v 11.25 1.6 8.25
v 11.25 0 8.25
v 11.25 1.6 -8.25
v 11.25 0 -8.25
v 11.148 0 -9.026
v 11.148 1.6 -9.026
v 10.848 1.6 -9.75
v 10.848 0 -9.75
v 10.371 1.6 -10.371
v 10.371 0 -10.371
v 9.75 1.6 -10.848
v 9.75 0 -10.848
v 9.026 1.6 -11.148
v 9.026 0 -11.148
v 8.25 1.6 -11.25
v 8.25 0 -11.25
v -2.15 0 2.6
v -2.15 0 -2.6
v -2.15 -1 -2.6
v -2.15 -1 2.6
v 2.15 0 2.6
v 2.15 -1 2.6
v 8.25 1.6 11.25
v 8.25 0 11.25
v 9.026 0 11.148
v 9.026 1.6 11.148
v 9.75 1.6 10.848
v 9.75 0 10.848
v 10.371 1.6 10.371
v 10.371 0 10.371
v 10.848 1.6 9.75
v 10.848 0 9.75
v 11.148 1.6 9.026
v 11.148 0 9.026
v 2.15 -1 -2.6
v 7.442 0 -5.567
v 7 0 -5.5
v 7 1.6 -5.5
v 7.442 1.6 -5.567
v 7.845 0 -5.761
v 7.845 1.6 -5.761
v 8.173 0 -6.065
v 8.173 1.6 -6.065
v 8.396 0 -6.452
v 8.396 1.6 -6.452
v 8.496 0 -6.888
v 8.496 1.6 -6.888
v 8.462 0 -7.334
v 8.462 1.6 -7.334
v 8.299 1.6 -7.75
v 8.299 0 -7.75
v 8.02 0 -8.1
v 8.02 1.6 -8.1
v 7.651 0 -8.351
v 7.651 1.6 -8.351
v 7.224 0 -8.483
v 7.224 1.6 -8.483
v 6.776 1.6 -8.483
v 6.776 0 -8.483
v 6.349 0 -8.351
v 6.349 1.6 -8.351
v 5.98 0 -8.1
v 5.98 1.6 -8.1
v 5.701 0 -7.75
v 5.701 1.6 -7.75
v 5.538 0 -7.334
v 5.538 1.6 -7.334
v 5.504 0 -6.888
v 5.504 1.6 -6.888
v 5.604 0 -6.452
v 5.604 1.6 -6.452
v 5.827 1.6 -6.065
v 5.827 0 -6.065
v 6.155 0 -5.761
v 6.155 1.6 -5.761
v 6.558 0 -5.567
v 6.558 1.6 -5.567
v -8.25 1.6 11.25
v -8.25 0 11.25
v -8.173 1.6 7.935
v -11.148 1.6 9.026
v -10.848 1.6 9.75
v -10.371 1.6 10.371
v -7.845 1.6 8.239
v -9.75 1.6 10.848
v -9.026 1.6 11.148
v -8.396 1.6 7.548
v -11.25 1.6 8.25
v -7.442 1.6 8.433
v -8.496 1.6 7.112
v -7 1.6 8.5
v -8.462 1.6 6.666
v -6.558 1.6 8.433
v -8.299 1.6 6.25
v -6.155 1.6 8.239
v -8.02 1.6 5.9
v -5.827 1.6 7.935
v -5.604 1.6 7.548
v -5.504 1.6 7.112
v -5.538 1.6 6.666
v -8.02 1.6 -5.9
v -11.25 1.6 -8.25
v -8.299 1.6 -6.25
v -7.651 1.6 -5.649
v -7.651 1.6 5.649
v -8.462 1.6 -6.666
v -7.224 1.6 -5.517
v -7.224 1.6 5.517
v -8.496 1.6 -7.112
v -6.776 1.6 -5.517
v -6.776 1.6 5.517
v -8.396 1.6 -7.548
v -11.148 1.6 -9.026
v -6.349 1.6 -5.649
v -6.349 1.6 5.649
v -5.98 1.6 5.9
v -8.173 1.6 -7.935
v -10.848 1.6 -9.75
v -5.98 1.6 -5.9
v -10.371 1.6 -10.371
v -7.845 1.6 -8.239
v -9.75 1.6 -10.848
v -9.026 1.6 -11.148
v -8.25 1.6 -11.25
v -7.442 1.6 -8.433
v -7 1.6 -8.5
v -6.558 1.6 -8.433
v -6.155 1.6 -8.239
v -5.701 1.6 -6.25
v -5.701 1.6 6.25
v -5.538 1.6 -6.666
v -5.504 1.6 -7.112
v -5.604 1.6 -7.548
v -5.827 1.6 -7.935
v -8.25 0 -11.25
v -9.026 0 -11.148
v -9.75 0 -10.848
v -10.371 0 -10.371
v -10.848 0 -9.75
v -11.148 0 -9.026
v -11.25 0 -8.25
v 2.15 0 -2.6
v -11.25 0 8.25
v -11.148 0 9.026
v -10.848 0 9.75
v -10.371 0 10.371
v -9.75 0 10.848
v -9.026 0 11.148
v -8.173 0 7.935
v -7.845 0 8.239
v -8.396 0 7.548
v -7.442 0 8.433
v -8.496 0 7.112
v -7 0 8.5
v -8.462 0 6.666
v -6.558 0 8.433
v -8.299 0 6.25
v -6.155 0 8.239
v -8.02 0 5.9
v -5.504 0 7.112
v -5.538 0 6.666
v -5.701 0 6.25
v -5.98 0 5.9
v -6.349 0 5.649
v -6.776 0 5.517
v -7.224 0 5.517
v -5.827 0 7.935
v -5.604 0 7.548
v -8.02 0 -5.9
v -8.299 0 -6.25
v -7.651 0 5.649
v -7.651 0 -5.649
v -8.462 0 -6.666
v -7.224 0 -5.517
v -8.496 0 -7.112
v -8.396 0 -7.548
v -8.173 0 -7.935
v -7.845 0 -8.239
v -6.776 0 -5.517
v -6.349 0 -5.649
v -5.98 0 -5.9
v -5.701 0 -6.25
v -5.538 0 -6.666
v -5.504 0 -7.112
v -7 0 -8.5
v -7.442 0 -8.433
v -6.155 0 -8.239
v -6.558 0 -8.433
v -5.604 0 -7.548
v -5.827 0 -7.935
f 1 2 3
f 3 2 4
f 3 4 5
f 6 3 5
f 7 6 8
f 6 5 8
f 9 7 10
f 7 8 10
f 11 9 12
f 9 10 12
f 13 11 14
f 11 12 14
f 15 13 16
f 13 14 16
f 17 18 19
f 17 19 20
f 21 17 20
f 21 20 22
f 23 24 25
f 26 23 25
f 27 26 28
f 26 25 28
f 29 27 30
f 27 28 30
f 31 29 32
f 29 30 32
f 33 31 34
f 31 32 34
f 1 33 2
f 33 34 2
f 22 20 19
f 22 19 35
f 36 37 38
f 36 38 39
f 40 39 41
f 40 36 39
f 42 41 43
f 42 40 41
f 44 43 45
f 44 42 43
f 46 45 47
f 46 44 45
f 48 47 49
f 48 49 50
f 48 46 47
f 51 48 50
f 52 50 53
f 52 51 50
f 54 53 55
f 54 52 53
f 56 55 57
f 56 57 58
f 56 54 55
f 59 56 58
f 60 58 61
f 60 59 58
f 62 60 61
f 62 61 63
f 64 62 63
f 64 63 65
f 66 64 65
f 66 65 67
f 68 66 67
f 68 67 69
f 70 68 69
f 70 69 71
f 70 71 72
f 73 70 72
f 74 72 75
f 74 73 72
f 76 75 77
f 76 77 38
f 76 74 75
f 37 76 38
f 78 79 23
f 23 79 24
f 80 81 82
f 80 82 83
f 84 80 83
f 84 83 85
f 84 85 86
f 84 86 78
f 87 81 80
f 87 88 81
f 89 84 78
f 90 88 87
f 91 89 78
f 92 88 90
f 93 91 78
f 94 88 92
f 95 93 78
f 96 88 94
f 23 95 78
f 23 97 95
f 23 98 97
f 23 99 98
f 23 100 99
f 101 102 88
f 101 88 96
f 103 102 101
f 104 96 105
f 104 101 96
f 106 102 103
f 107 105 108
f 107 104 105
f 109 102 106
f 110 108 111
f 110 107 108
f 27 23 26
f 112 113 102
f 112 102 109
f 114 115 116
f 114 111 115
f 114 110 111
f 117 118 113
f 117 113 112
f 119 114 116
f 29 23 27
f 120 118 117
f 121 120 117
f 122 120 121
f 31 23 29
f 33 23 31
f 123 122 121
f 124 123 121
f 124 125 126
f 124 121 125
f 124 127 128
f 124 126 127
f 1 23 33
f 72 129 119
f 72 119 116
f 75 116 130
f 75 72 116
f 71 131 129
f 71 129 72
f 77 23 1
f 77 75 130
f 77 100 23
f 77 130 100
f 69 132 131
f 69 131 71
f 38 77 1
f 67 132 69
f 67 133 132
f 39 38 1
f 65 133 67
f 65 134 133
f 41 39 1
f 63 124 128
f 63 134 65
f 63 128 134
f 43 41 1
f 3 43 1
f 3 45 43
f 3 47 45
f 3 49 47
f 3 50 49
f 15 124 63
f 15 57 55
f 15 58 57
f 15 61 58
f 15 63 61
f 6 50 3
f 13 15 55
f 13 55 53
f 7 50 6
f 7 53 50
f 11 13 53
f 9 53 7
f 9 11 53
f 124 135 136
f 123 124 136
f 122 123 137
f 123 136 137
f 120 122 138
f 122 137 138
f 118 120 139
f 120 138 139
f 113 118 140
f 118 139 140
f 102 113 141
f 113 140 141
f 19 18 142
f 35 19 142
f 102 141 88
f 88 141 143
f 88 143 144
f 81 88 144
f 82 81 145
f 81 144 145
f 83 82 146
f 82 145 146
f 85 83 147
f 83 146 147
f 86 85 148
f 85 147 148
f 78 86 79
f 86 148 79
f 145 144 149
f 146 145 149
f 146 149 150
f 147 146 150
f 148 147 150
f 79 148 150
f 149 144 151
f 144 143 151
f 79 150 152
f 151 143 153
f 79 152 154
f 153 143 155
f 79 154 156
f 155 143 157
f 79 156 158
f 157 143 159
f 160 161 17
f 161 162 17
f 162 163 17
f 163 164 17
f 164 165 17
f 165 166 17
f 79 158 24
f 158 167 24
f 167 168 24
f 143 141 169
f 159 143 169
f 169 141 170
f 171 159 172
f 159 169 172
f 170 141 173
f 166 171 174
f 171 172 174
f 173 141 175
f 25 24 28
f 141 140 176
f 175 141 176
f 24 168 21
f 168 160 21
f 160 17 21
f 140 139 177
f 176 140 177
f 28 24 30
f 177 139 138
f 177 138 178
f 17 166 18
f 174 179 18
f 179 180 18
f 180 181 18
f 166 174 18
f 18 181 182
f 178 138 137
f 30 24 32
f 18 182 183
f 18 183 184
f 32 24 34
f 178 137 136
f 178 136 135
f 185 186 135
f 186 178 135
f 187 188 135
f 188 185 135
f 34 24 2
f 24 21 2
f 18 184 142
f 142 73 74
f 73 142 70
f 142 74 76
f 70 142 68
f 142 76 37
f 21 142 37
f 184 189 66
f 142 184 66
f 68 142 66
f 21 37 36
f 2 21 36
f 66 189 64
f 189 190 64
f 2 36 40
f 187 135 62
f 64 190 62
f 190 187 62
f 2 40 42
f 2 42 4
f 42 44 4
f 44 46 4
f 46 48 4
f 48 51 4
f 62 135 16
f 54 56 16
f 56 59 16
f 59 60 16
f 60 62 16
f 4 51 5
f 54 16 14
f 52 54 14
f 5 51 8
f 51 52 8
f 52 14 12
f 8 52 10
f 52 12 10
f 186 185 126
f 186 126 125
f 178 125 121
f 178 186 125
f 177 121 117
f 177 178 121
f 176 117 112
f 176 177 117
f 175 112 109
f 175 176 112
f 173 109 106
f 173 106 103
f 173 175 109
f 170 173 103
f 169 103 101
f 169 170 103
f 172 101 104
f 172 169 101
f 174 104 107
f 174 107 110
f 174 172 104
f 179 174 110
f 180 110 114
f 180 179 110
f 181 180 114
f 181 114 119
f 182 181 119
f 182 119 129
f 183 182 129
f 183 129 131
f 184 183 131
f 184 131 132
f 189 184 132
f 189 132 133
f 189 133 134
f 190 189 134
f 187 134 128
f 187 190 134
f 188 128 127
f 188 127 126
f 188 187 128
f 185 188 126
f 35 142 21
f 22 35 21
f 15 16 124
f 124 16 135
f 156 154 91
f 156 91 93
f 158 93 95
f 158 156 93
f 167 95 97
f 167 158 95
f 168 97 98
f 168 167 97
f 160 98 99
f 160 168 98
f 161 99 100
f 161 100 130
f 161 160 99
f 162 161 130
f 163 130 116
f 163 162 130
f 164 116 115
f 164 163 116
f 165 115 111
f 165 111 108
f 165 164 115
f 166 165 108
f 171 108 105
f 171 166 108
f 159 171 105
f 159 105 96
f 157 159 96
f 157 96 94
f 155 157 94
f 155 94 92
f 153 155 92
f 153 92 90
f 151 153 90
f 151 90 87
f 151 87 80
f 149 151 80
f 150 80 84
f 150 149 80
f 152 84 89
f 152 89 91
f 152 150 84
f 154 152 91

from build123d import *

# Parameters (mm, degrees)
SKETCH1_R           = 1.5
BOSS_EXTRUDE1_DEPTH = 1.6
SKETCH2_W           = 4.3
SKETCH2_H           = 5.2
BOSS_EXTRUDE2_DEPTH = 1


with BuildPart() as part:
    # Sketch1 → Boss-Extrude1 (new body)
    with BuildSketch(Plane(origin=(0, 0, 0), x_dir=(1, 0, 0), z_dir=(0, 1, 0))):
        with BuildLine():
            Line((8.25, 11.25), (-8.25, 11.25))
            ThreePointArc((-8.25, 11.25), (-10.371320344, 10.371320344), (-11.25, 8.25))
            Line((-11.25, 8.25), (-11.25, -8.25))
            ThreePointArc((-11.25, -8.25), (-10.371320344, -10.371320344), (-8.25, -11.25))
            Line((-8.25, -11.25), (8.25, -11.25))
            ThreePointArc((8.25, -11.25), (10.371320344, -10.371320344), (11.25, -8.25))
            Line((11.25, -8.25), (11.25, 8.25))
            ThreePointArc((11.25, 8.25), (10.371320344, 10.371320344), (8.25, 11.25))
        make_face()
        with Locations(Location((7, 7, 0), (0, 0, 270))):
            Circle(SKETCH1_R, mode=Mode.SUBTRACT)
        with Locations(Location((-7, 7, 0), (0, 0, 90))):
            Circle(SKETCH1_R, mode=Mode.SUBTRACT)
        with Locations(Location((-7, -7, 0), (0, 0, 270))):
            Circle(SKETCH1_R, mode=Mode.SUBTRACT)
    extrude(amount=BOSS_EXTRUDE1_DEPTH)

    # Sketch2 → Boss-Extrude2 (add)
    with BuildSketch(Plane.XZ):
        Rectangle(SKETCH2_W, SKETCH2_H)
    extrude(amount=BOSS_EXTRUDE2_DEPTH)


solid = part.part
